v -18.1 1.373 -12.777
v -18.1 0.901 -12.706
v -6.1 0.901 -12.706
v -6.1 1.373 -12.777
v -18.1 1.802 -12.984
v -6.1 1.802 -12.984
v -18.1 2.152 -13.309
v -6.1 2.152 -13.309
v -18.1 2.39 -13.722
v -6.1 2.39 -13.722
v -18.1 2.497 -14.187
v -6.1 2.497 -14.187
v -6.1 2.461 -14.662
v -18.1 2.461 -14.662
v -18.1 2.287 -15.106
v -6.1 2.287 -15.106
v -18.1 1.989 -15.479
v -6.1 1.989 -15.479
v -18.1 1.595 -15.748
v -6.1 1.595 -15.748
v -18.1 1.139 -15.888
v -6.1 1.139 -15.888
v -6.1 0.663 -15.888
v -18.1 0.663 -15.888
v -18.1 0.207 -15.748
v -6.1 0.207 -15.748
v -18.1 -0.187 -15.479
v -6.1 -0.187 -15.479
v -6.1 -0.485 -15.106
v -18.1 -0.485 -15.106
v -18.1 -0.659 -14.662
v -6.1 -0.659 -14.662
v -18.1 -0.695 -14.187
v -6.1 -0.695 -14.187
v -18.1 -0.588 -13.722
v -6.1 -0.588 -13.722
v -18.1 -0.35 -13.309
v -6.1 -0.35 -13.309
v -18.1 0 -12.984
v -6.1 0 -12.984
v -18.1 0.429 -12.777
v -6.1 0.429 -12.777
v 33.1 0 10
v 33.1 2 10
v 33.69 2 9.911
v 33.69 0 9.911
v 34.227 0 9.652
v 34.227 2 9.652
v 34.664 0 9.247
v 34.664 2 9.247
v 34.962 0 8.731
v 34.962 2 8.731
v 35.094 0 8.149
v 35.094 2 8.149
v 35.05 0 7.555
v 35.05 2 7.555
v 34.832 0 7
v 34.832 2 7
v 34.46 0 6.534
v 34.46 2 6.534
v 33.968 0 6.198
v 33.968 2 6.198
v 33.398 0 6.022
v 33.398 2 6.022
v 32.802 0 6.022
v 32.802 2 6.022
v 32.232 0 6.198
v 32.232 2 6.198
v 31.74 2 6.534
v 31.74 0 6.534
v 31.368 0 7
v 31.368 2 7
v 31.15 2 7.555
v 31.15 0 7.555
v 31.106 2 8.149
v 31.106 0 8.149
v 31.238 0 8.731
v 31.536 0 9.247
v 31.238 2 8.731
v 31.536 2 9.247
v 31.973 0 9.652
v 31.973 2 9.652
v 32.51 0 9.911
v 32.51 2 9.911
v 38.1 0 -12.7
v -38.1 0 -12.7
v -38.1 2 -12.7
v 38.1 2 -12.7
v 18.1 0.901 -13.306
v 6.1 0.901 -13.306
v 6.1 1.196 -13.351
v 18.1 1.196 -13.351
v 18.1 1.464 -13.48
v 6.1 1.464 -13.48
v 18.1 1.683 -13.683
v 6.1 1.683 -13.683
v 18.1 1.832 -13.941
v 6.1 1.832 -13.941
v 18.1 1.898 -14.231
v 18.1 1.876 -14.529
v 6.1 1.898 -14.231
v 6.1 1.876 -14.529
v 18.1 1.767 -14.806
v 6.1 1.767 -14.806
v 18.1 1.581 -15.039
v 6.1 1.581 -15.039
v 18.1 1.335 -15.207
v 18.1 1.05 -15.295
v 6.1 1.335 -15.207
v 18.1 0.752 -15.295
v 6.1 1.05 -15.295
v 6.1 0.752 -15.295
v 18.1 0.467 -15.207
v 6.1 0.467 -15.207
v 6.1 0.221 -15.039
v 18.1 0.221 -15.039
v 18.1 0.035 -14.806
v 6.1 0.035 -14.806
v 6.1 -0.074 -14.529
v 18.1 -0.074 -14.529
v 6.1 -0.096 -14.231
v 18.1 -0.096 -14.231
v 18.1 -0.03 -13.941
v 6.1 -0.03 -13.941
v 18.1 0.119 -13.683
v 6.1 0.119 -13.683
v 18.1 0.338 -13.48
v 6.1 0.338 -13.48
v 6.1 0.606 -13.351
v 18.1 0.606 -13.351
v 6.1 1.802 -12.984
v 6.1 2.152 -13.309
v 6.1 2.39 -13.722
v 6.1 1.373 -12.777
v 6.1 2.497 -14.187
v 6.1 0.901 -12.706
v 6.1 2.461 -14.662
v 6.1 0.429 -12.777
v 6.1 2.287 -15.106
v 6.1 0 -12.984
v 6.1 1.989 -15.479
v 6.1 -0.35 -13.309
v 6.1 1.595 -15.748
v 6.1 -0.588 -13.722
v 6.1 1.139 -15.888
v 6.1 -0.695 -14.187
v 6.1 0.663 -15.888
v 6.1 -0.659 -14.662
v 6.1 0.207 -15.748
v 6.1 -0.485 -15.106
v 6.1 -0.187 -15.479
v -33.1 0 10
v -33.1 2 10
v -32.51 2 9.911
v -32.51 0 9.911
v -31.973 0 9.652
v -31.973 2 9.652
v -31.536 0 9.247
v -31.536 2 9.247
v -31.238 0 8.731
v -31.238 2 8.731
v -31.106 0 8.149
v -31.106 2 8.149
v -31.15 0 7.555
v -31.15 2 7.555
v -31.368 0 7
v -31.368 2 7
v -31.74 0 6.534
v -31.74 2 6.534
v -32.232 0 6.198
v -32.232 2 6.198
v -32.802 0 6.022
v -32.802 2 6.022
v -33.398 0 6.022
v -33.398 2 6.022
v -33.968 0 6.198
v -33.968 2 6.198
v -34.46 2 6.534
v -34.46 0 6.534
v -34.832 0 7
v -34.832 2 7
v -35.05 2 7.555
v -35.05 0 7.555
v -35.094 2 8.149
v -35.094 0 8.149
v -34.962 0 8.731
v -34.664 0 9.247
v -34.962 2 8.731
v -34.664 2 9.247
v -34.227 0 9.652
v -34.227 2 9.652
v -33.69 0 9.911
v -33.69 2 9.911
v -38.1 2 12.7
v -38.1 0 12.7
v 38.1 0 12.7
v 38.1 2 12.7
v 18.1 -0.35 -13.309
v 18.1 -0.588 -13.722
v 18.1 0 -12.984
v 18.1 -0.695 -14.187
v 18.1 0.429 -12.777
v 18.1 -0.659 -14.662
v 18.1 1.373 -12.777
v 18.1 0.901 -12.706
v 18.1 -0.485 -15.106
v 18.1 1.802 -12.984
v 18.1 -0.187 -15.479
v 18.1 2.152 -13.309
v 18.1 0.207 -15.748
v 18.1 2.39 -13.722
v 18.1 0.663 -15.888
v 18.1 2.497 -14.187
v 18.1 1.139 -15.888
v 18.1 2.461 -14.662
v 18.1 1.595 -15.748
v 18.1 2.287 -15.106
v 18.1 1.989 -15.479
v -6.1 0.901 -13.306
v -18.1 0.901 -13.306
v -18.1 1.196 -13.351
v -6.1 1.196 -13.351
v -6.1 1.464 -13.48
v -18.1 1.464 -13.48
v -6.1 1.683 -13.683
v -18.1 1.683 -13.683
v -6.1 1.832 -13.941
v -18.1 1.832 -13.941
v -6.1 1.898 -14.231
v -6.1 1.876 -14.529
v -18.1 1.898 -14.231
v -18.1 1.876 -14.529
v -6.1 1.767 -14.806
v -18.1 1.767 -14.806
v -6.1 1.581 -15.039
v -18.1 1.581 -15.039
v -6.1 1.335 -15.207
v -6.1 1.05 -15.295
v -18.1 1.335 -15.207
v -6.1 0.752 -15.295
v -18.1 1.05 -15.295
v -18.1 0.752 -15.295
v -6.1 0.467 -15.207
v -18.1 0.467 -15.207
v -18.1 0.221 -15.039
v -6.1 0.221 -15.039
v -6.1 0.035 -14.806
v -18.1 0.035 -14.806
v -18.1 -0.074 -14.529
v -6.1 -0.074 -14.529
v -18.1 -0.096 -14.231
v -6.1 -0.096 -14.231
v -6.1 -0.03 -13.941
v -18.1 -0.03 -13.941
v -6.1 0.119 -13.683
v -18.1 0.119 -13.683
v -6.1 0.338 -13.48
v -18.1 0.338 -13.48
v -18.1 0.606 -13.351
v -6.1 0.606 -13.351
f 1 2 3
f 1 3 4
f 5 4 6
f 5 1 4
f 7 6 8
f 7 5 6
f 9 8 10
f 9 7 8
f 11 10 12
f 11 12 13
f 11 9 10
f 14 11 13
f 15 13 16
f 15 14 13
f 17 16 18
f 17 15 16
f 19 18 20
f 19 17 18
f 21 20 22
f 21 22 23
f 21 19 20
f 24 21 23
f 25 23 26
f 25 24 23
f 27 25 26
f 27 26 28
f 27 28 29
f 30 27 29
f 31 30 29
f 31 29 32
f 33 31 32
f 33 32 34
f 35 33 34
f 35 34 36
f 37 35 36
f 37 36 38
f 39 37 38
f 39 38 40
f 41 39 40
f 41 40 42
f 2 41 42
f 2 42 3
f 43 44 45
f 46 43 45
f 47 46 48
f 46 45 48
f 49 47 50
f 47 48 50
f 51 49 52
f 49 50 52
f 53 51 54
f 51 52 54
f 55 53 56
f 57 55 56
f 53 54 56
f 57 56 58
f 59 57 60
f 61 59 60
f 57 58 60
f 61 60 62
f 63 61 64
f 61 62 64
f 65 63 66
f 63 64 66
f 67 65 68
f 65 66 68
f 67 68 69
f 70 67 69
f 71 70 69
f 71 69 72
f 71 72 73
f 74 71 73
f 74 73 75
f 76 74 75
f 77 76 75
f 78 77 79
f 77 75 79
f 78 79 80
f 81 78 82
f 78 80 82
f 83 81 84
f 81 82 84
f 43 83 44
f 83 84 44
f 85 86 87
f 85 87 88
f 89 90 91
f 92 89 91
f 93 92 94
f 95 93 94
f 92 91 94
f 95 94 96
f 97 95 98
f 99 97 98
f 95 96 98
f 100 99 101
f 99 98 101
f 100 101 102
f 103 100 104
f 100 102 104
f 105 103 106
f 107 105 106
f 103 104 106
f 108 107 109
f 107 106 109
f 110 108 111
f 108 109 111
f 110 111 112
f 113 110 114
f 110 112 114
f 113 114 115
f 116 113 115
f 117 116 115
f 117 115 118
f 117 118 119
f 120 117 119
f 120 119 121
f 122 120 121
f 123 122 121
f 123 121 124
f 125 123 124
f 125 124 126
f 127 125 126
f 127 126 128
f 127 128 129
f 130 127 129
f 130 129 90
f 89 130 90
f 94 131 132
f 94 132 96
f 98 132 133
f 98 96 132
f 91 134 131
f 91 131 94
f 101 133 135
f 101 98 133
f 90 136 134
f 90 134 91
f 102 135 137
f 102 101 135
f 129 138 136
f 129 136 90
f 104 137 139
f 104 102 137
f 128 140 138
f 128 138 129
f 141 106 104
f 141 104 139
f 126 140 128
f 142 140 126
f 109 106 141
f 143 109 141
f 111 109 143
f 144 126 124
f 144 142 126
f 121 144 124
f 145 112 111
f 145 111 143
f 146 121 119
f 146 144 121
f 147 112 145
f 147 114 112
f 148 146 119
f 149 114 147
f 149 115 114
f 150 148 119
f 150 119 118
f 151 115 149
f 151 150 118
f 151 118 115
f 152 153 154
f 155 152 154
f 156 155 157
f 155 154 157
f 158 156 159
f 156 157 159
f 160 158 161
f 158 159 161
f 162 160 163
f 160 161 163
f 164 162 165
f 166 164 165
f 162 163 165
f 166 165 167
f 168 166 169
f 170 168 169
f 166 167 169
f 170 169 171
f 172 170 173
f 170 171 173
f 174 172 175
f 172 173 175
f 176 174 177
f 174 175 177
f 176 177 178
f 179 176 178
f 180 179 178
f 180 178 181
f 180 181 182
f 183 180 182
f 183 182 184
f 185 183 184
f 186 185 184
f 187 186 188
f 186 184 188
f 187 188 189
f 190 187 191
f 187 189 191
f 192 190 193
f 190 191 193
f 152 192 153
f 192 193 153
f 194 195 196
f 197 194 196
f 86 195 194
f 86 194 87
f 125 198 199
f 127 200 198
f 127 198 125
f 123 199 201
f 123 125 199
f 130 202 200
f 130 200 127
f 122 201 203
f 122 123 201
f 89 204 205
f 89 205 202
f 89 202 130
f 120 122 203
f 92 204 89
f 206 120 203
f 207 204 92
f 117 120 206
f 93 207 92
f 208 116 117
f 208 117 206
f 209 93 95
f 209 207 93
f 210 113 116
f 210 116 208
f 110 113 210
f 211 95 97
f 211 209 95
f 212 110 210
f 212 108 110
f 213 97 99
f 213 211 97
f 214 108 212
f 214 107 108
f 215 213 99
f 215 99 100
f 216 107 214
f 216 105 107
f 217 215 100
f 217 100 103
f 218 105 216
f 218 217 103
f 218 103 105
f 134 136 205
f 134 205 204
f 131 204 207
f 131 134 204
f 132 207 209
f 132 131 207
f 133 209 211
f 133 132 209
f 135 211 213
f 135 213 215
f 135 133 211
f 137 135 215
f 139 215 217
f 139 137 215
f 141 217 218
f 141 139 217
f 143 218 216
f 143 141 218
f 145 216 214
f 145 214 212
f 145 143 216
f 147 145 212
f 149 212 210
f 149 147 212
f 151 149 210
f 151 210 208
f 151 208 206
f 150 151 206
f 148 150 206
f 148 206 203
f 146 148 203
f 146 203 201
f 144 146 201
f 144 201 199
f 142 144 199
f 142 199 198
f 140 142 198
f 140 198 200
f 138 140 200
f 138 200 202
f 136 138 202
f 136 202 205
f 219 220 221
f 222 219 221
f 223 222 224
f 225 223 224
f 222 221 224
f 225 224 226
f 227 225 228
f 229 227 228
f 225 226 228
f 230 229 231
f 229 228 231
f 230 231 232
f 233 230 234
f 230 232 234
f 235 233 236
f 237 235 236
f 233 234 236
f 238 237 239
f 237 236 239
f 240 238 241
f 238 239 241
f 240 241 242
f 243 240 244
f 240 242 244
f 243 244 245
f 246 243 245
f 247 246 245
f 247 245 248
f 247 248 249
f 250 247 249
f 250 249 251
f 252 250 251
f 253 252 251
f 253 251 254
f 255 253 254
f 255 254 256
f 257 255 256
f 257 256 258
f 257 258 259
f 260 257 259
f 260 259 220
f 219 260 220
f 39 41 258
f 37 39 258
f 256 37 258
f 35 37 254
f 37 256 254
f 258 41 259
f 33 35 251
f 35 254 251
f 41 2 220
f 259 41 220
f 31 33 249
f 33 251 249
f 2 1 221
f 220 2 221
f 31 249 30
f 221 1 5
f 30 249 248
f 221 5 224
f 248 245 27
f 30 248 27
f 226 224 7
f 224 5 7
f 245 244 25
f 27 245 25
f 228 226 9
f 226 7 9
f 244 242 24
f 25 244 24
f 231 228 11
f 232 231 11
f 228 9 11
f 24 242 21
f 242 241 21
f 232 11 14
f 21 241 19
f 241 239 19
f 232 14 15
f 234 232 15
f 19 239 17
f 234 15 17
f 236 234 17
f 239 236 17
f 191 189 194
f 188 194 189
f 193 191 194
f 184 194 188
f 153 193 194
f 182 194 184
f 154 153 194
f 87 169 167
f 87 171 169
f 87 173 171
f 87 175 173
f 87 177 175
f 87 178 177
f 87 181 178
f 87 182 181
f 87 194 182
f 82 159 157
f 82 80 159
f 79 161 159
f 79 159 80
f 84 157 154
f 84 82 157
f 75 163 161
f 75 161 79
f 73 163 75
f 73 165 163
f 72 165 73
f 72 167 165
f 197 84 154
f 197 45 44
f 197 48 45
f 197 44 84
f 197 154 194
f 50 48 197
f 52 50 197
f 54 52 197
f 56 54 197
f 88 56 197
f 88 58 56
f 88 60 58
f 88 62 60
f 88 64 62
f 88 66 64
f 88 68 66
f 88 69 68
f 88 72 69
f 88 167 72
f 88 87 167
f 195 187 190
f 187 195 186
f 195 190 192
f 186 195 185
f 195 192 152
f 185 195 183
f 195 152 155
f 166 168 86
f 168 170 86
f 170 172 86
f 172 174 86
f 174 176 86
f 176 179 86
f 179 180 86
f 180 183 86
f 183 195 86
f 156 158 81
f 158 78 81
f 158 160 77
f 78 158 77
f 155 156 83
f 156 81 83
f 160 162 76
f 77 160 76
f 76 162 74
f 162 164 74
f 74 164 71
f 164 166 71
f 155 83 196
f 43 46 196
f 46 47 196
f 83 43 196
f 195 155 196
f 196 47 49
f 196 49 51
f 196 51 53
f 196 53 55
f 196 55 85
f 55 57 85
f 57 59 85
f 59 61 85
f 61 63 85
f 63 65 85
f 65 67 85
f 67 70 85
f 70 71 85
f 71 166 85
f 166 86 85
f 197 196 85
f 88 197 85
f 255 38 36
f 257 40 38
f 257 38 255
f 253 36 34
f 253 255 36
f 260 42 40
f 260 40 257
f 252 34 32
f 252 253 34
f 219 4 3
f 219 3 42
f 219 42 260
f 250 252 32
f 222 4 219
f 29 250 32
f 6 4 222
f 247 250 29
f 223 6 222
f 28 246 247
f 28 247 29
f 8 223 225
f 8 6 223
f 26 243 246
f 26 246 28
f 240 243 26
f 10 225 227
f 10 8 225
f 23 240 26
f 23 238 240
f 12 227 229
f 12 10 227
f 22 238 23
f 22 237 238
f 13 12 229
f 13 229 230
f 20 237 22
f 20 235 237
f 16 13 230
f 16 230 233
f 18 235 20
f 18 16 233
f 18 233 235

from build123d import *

# Parameters (mm, degrees)
CROQUIS1_W                        = 76.2
CROQUIS1_H                        = 25.4
SALIENTE_EXTRUIR1_DEPTH           = 2
CROQUIS2_R                        = 1.6
SALIENTE_EXTRUIR2_DEPTH           = 76.2
CROQUIS3_R                        = 2
CORTAR_EXTRUIR1_DEPTH             = 2
CROQUIS4_R                        = 1
CORTAR_EXTRUIR2_DEPTH             = 76.2
CORTAR_EXTRUIR5_REACH             = 43.375
CROQUIS5_W                        = 20
CROQUIS5_H                        = 3.21236059
CROQUIS5_H_2                      = 3.2
CROQUIS5_W_2                      = 12.2
CORTAR_EXTRUIR5_DIRECTION_2_REACH = 43.375


with BuildPart() as part:
    # Croquis1 → Saliente-Extruir1 (new body)
    with BuildSketch(Plane(origin=(0, 0, 0), x_dir=(1, 0, 0), z_dir=(0, 1, 0))):
        Rectangle(CROQUIS1_W, CROQUIS1_H)
    extrude(amount=SALIENTE_EXTRUIR1_DEPTH)

    # Croquis3 → Cortar-Extruir1 (cut)
    with BuildSketch(Plane(origin=(0, 2, 0), x_dir=(1, 0, 0), z_dir=(0, 1, 0))):
        with Locations(Location((-33.1, -8, 0), (0, 0, 270))):
            Circle(CROQUIS3_R)
        with Locations(Location((33.1, -8, 0), (0, 0, 270))):
            Circle(CROQUIS3_R)
    extrude(amount=-CORTAR_EXTRUIR1_DEPTH, mode=Mode.SUBTRACT)


with BuildPart() as body_2:
    # Croquis2 → Saliente-Extruir2 (new body)
    with BuildSketch(Plane.ZY.offset(38.1)):
        with Locations((-14.306180295, 0.901009784)):
            Circle(CROQUIS2_R)
    extrude(amount=-SALIENTE_EXTRUIR2_DEPTH)

    # Croquis4 → Cortar-Extruir2 (cut)
    with BuildSketch(Plane.ZY.offset(38.1)):
        with Locations((-14.306180295, 0.901009784)):
            Circle(CROQUIS4_R)
    extrude(amount=-CORTAR_EXTRUIR2_DEPTH, mode=Mode.SUBTRACT)

    # Croquis5 → Cortar-Extruir5 (cut, up to next)
    with BuildSketch(Plane(origin=(0, 2, 0), x_dir=(1, 0, 0), z_dir=(0, 1, 0)), mode=Mode.PRIVATE) as cortar_extruir5_sk1:
        with Locations((-28.1, 14.306180295)):
            Rectangle(CROQUIS5_W, CROQUIS5_H)
    cortar_extruir5_tool1 = extrude(cortar_extruir5_sk1.sketch, amount=-CORTAR_EXTRUIR5_REACH, mode=Mode.PRIVATE) & body_2.part
    # Croquis5 → Cortar-Extruir5 (cut, up to next)
    with BuildSketch(Plane(origin=(0, 2, 0), x_dir=(1, 0, 0), z_dir=(0, 1, 0)), mode=Mode.PRIVATE) as cortar_extruir5_sk2:
        with Locations((28.1, 14.306180295)):
            Rectangle(CROQUIS5_W, CROQUIS5_H_2)
    cortar_extruir5_tool2 = extrude(cortar_extruir5_sk2.sketch, amount=-CORTAR_EXTRUIR5_REACH, mode=Mode.PRIVATE) & body_2.part
    # Croquis5 → Cortar-Extruir5 (cut, up to next)
    with BuildSketch(Plane(origin=(0, 2, 0), x_dir=(1, 0, 0), z_dir=(0, 1, 0)), mode=Mode.PRIVATE) as cortar_extruir5_sk3:
        with Locations((0, 14.306180295)):
            Rectangle(CROQUIS5_W_2, CROQUIS5_H_2)
    cortar_extruir5_tool3 = extrude(cortar_extruir5_sk3.sketch, amount=-CORTAR_EXTRUIR5_REACH, mode=Mode.PRIVATE) & body_2.part
    add(cortar_extruir5_tool1.solids().sort_by_distance((-28.1, 2, -14.30618))[0], mode=Mode.SUBTRACT)
    add(cortar_extruir5_tool2.solids().sort_by_distance((28.1, 2, -14.30618))[0], mode=Mode.SUBTRACT)
    add(cortar_extruir5_tool3.solids().sort_by_distance((0, 2, -14.30618))[0], mode=Mode.SUBTRACT)

    # Croquis5 → Cortar-Extruir5 direction 2 (cut, up to next)
    with BuildSketch(Plane(origin=(0, 2, 0), x_dir=(1, 0, 0), z_dir=(0, 1, 0)), mode=Mode.PRIVATE) as cortar_extruir5_direction_2_sk1:
        with Locations((-28.1, 14.306180295)):
            Rectangle(CROQUIS5_W, CROQUIS5_H)
    cortar_extruir5_direction_2_tool1 = extrude(cortar_extruir5_direction_2_sk1.sketch, amount=CORTAR_EXTRUIR5_DIRECTION_2_REACH, mode=Mode.PRIVATE) & body_2.part
    # Croquis5 → Cortar-Extruir5 direction 2 (cut, up to next)
    with BuildSketch(Plane(origin=(0, 2, 0), x_dir=(1, 0, 0), z_dir=(0, 1, 0)), mode=Mode.PRIVATE) as cortar_extruir5_direction_2_sk2:
        with Locations((28.1, 14.306180295)):
            Rectangle(CROQUIS5_W, CROQUIS5_H_2)
    cortar_extruir5_direction_2_tool2 = extrude(cortar_extruir5_direction_2_sk2.sketch, amount=CORTAR_EXTRUIR5_DIRECTION_2_REACH, mode=Mode.PRIVATE) & body_2.part
    # Croquis5 → Cortar-Extruir5 direction 2 (cut, up to next)
    with BuildSketch(Plane(origin=(0, 2, 0), x_dir=(1, 0, 0), z_dir=(0, 1, 0)), mode=Mode.PRIVATE) as cortar_extruir5_direction_2_sk3:
        with Locations((0, 14.306180295)):
            Rectangle(CROQUIS5_W_2, CROQUIS5_H_2)
    cortar_extruir5_direction_2_tool3 = extrude(cortar_extruir5_direction_2_sk3.sketch, amount=CORTAR_EXTRUIR5_DIRECTION_2_REACH, mode=Mode.PRIVATE) & body_2.part
    add(cortar_extruir5_direction_2_tool1.solids().sort_by_distance((-28.1, 2, -14.30618))[0], mode=Mode.SUBTRACT)
    add(cortar_extruir5_direction_2_tool2.solids().sort_by_distance((28.1, 2, -14.30618))[0], mode=Mode.SUBTRACT)
    add(cortar_extruir5_direction_2_tool3.solids().sort_by_distance((0, 2, -14.30618))[0], mode=Mode.SUBTRACT)


with BuildPart() as cortar_extruir5_piece_1:
    # of the separate pieces the step leaves, piece 1, a body of its own (cortar_extruir5_pieces)
    add(body_2.part.solids().sort_by_distance((6.1, 0.901009784, -12.706180295))[0])


with BuildPart() as cortar_extruir5_piece_2:
    # of the separate pieces the step leaves, piece 2, a body of its own (cortar_extruir5_pieces)
    add(body_2.part.solids().sort_by_distance((-18.1, 0.901009784, -12.706180295))[0])


solid = Compound([part.part, cortar_extruir5_piece_1.part, cortar_extruir5_piece_2.part])
